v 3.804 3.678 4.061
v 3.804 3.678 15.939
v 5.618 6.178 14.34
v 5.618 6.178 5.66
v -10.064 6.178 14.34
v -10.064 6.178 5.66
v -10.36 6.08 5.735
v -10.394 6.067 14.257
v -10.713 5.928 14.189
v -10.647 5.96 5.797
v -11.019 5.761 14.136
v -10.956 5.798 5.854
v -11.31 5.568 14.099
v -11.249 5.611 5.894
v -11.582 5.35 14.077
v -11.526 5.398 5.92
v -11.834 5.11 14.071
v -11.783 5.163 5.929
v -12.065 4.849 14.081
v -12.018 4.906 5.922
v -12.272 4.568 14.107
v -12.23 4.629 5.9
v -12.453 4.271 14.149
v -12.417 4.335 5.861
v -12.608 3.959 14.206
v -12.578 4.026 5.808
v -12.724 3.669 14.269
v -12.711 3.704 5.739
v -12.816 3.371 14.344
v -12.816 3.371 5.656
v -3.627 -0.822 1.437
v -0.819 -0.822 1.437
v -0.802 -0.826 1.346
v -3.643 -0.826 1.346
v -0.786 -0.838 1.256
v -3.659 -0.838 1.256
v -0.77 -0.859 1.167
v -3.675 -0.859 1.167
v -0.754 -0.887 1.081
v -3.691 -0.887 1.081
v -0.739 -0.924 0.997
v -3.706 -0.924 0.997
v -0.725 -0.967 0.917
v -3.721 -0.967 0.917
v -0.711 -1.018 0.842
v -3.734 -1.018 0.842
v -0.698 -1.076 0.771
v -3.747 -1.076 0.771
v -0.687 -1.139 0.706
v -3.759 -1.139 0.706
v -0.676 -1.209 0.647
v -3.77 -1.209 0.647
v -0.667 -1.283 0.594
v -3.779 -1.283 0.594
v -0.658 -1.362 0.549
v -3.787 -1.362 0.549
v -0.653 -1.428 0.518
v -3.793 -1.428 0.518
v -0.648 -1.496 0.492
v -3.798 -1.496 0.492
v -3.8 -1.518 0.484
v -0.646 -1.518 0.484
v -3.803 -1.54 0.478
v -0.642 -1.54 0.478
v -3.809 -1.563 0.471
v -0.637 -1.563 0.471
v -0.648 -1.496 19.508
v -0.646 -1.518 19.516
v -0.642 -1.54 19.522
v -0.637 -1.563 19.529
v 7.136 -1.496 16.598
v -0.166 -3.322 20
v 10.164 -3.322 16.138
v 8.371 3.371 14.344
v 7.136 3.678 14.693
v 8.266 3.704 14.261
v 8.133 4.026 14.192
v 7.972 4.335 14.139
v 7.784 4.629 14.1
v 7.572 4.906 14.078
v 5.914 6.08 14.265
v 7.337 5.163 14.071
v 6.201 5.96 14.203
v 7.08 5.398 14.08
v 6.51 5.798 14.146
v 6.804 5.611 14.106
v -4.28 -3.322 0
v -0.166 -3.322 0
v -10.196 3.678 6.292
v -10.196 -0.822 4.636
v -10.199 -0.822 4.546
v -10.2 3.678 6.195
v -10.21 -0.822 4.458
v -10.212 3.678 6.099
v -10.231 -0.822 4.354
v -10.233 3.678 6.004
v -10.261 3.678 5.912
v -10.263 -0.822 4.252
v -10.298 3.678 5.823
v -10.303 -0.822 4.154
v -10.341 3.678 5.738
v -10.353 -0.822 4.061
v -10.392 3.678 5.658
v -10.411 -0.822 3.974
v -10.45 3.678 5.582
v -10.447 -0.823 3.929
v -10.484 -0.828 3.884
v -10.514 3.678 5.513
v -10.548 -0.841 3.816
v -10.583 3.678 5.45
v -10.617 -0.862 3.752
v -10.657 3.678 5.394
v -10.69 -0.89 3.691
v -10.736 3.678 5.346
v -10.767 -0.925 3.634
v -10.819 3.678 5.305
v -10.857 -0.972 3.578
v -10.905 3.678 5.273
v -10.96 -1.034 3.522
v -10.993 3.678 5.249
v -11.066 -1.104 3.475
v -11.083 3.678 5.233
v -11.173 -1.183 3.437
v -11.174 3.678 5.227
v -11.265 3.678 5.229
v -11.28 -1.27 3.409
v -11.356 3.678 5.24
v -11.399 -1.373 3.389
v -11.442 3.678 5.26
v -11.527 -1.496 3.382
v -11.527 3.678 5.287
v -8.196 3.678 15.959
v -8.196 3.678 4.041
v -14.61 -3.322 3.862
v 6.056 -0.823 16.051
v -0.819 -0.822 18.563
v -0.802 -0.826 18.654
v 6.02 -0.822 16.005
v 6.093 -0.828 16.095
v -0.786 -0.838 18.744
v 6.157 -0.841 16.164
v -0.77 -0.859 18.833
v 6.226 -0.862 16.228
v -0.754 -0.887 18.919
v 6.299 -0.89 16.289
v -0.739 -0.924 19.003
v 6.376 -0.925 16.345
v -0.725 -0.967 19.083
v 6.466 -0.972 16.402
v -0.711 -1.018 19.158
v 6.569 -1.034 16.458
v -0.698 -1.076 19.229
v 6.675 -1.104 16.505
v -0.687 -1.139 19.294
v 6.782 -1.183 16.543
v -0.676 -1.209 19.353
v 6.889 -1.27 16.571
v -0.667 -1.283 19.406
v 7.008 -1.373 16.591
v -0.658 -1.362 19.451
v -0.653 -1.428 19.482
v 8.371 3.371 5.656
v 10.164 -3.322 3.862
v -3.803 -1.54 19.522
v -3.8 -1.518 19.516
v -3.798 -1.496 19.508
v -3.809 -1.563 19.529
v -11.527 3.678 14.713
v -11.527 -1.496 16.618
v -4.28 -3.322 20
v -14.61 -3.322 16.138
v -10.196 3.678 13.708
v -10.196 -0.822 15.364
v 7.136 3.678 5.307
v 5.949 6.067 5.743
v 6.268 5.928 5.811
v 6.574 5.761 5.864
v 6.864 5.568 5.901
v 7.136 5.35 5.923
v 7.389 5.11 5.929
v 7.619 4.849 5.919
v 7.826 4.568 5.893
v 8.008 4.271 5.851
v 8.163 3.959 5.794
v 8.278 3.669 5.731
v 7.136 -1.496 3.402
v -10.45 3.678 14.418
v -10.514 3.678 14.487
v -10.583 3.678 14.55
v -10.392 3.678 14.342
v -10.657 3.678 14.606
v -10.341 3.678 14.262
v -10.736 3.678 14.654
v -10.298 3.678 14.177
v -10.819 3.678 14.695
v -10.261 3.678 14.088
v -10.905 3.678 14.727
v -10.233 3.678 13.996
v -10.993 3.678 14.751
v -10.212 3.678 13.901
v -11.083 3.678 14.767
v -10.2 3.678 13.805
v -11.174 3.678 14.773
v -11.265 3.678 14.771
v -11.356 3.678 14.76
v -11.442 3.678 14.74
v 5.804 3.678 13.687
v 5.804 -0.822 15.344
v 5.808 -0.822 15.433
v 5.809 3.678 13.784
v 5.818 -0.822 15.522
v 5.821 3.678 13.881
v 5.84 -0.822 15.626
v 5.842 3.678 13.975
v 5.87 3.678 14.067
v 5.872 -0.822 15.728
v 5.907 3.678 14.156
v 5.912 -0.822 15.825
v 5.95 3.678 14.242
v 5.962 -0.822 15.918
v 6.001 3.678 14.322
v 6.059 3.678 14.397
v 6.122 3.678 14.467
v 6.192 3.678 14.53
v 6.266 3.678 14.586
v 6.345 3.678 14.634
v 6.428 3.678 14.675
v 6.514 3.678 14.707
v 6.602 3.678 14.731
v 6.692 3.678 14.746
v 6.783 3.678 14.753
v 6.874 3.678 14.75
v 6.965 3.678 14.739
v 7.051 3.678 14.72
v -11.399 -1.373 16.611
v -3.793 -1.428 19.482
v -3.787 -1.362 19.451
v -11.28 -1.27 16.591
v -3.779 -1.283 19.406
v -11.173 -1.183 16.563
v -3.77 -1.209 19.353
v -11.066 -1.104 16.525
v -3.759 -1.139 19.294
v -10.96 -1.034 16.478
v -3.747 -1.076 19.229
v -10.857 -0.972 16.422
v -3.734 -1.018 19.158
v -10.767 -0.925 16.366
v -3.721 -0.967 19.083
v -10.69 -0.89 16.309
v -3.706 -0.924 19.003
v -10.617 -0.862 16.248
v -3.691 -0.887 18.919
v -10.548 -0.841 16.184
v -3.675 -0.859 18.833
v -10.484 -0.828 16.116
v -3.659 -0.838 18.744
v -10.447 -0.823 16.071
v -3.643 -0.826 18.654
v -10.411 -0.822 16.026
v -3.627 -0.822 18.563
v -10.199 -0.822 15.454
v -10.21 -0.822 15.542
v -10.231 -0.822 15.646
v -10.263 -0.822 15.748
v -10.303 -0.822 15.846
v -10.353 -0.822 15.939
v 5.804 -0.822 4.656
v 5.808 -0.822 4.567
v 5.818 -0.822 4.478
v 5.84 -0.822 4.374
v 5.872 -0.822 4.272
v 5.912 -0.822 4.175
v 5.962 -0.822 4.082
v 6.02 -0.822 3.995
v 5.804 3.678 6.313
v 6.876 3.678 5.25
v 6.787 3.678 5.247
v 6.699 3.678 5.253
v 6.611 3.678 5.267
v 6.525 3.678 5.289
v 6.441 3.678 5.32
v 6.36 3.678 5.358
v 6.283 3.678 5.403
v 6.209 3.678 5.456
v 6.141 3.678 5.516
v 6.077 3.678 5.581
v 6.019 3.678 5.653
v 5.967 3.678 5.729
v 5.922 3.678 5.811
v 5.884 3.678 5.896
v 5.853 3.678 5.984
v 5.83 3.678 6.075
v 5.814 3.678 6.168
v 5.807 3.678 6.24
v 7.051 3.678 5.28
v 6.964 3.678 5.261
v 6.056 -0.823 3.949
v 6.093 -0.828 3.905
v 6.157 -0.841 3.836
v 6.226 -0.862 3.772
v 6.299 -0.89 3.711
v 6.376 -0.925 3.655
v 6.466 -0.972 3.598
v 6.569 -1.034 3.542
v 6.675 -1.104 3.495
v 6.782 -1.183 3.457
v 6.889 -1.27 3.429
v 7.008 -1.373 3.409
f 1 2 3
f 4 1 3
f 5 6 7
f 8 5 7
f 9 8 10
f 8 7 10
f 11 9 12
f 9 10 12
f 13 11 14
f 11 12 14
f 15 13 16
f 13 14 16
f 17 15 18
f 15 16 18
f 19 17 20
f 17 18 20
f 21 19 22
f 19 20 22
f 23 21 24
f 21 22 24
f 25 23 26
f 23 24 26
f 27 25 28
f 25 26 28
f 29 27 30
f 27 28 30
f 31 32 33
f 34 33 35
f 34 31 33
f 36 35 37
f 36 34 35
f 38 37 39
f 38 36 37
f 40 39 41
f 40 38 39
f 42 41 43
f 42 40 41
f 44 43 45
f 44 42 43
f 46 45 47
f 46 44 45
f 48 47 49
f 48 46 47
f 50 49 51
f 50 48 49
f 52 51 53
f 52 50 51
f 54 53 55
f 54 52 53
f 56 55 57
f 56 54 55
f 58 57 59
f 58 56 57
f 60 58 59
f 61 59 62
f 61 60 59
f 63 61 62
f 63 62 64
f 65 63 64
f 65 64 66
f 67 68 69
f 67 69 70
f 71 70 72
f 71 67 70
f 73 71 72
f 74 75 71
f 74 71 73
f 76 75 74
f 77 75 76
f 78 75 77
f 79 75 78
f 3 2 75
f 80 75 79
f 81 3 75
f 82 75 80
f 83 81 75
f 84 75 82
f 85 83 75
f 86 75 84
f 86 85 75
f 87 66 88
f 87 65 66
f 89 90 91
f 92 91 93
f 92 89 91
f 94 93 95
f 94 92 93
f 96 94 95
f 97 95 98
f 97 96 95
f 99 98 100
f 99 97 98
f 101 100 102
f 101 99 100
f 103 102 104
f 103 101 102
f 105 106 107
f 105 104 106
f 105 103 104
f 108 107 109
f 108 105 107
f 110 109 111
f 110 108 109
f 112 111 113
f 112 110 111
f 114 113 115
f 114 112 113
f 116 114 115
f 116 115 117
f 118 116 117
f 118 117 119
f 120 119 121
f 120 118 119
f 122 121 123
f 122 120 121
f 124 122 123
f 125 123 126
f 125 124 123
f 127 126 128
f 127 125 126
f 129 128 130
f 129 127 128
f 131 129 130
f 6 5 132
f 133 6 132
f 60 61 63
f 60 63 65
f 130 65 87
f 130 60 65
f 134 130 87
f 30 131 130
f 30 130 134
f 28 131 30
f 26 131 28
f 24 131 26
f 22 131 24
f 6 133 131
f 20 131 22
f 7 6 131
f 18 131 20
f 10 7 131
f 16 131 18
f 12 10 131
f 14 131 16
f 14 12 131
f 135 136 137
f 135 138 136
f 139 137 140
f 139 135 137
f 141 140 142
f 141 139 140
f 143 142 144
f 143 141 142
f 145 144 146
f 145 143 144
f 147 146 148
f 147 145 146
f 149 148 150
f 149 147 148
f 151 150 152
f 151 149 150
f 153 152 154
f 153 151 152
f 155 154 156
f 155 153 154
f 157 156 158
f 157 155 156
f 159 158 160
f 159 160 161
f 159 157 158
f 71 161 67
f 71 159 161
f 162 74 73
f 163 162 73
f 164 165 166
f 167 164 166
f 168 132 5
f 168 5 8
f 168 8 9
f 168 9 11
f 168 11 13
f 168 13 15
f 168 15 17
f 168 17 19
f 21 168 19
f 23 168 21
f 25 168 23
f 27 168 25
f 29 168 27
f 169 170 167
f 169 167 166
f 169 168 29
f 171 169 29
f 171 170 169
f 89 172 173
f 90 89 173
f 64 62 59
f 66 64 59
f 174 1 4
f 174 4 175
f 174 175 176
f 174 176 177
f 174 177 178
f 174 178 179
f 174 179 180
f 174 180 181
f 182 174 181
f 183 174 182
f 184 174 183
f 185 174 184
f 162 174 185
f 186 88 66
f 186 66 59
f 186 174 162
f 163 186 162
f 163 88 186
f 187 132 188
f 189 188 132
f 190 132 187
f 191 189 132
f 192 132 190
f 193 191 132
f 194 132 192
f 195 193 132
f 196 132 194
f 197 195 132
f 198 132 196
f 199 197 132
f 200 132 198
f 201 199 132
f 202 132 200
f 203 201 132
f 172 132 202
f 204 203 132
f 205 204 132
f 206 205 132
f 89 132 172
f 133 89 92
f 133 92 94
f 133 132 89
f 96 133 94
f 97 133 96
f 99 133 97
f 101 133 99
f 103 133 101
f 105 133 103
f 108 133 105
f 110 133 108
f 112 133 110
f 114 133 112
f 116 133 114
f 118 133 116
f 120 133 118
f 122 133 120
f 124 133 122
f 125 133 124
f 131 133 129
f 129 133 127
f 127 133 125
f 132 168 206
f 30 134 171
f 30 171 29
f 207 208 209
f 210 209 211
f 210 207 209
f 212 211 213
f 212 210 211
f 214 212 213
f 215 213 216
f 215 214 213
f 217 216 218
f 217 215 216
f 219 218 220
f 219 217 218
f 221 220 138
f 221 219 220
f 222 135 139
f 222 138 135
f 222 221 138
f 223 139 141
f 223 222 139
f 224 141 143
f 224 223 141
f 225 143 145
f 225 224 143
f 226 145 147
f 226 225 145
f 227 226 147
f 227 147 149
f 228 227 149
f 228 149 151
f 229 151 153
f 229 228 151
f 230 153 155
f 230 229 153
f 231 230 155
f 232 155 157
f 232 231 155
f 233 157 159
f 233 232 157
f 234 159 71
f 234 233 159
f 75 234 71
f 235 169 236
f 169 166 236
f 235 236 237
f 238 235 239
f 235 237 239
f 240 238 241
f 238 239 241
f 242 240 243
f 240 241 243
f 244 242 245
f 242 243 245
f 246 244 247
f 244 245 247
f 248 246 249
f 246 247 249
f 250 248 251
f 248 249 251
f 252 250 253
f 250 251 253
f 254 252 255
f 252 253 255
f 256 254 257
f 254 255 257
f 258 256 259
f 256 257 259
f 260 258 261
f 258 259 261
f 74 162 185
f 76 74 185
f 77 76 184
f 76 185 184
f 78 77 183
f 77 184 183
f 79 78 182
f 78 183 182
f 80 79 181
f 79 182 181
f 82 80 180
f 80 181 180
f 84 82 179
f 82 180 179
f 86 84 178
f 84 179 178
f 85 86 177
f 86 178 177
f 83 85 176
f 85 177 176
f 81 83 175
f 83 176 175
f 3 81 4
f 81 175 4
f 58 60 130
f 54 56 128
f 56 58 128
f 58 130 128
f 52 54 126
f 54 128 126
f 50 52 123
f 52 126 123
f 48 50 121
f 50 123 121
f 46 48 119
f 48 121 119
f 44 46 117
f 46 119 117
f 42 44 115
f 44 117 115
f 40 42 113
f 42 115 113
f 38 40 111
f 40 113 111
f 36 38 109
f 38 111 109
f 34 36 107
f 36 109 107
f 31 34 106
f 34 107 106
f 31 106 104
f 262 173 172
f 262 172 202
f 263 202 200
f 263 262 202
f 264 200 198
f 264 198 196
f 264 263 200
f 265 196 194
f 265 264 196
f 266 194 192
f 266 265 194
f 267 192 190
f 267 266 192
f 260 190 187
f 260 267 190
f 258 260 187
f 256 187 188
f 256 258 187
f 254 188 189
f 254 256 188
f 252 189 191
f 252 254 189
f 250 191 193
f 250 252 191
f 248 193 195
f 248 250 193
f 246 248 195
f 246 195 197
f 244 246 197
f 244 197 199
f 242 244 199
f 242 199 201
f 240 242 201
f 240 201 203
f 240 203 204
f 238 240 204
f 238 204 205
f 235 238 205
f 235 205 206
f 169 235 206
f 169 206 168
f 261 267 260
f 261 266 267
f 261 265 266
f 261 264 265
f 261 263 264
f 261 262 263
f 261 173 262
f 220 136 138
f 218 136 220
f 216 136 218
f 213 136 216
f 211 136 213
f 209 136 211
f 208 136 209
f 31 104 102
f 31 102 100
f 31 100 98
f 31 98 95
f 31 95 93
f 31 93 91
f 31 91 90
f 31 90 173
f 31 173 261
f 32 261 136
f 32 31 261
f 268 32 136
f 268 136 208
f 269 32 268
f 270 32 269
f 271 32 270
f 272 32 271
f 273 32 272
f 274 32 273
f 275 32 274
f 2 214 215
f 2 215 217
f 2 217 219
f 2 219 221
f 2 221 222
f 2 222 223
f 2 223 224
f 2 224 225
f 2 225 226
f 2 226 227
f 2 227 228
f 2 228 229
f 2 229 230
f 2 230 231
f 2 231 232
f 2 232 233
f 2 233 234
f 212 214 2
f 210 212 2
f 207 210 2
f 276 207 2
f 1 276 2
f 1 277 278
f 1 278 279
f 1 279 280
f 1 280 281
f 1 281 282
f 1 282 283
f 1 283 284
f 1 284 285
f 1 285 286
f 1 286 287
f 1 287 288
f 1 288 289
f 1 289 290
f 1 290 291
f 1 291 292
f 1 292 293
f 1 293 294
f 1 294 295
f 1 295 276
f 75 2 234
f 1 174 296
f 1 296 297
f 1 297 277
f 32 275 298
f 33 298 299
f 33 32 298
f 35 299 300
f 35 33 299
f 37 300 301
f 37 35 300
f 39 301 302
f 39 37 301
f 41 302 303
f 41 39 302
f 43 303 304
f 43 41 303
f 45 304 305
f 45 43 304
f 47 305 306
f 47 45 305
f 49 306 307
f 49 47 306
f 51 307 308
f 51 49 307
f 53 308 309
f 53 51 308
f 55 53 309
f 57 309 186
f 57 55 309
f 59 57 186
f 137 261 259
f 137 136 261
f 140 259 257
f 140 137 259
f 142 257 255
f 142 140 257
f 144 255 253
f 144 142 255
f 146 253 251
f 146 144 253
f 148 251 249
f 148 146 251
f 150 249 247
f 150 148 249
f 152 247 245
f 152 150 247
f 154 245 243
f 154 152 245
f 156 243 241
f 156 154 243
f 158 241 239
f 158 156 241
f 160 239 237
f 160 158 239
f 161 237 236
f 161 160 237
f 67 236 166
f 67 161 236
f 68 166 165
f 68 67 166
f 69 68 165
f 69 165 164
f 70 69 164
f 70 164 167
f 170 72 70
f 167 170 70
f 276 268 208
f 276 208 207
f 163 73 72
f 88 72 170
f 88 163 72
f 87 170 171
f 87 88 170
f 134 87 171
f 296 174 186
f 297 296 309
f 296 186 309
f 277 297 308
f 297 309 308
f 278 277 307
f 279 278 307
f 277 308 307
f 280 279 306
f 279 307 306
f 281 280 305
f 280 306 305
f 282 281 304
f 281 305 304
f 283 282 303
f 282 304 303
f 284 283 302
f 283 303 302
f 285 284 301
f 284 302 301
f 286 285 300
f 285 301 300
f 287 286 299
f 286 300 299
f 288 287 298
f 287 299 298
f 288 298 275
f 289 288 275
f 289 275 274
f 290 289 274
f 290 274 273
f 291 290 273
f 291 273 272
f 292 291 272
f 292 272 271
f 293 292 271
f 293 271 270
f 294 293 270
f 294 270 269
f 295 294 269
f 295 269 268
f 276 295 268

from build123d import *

# Parameters (mm, degrees)
EXTRUDE_1_DEPTH          = 20
CUT_EXTRUDE_1_DEPTH      = 26.52668646
CUT_EXTRUDE_1_DEPTH_BACK = 26.52668646
FILLET_1_R               = 4
CHAMFER_1_SIZE           = 10
CHAMFER_1_SIZE_2         = 3.739269956
FILLET_2_R               = 1


with BuildPart() as part:
    # 草圖2 → 填料-伸長1 (new body)
    with BuildSketch(Plane.XY):
        Polygon((-8.195537152, 3.678491207), (-10.195537152, 3.678491207), (-10.195537152, -0.821508793), (5.804462848, -0.821508793), (5.804462848, 3.678491207), (3.804462848, 3.678491207), (5.618474025, 6.178491207), (7.618474025, 6.178491207), (10.163991353, -3.321508793), (-14.609516351, -3.321508793), (-12.063999023, 6.178491207), (-10.063999023, 6.178491207), align=None)
    extrude(amount=EXTRUDE_1_DEPTH)

    # 草圖3 → 除料-伸長1 (cut, two sides: drawn at the far end of the back side and taken through both)
    with BuildSketch(Plane(origin=(0, 0, 0), x_dir=(0, 0, -1), z_dir=(1, 0, 0)).offset(-CUT_EXTRUDE_1_DEPTH_BACK)):
        Polygon((-20, -3.321508793), (-17.454482672, 6.178491207), (-20, 6.178491207), align=None)
        Polygon((0, 6.178491207), (-2.545517328, 6.178491207), (0, -3.321508793), align=None)
    extrude(amount=CUT_EXTRUDE_1_DEPTH + CUT_EXTRUDE_1_DEPTH_BACK, mode=Mode.SUBTRACT)

    # 圓角1
    # the kernel refuses this fillet: 4 mm, written as the material it takes off along each edge
    with BuildSketch(Plane(origin=(7.618474025, 6.178491207, -4.720017408), x_dir=(-1, 0, 0), z_dir=(0, 0, 1))) as fillet_1_piece_1:
        with BuildLine():
            CenterArc((3.1115198, 3.842463238), FILLET_1_R, 195, 58.866285833)
            Line((-0.752183505, 2.807187057), (-0.829457571, 2.786481534))
            Line((-0.829457571, 2.786481534), (-0.077274066, -0.020705524))
            Line((-0.077274066, -0.020705524), (0, -0.08))
            ThreePointArc((0, -0.08), (1, -0.08), (1.977769604, -0.076849265))
            Line((1.977769604, -0.076849265), (2, 0))
        make_face()
    extrude(amount=29.440034816, mode=Mode.SUBTRACT)
    with BuildSketch(Plane(origin=(-12.063999023, 6.178491207, -4.720017408), x_dir=(1, 0, 0), z_dir=(0, 0, 1))) as fillet_1_piece_2:
        with BuildLine():
            CenterArc((3.1115198, -3.842463238), FILLET_1_R, 106.133714167, 58.866285833)
            Line((-0.752183505, -2.807187057), (-0.829457571, -2.786481534))
            Line((-0.829457571, -2.786481534), (-0.077274066, 0.020705524))
            Line((-0.077274066, 0.020705524), (0, 0.08))
            ThreePointArc((0, 0.08), (1, 0.08), (1.977769604, 0.076849265))
            Line((1.977769604, 0.076849265), (2, 0))
        make_face()
    extrude(amount=29.440034816, mode=Mode.SUBTRACT)

    # 導角1
    # the kernel refuses this chamfer: 10, 3.739269956 mm, written as the material it takes off along each edge
    with BuildSketch(Plane(origin=(16.664078496, -27.580164265, -6.500087143), x_dir=(-0.9680162049238082, -0.23859176587740763, -0.07757961240176374), z_dir=(-0.25056280708573614, 0.9351131265310298, 0.25056280708572526)), Plane(origin=(-6.316095385, 27.629959622, 8.293420966), x_dir=(0.9680162049238085, -0.23859176587740732, -0.0775796124017635), z_dir=(-0.2505628070857358, -0.93511312653103, -0.2505628070857253)), Plane(origin=(-21.109603495, -27.580164265, 26.500087143), x_dir=(0.9680162049238082, -0.23859176587740735, 0.07757961240176349), z_dir=(0.25056280708573586, 0.9351131265310301, -0.2505628070857251)), Plane(origin=(1.870570387, 27.629959622, 11.706579034), x_dir=(-0.9680162049238082, -0.23859176587740777, 0.07757961240176336), z_dir=(0.25056280708573614, -0.93511312653103, 0.25056280708572504))) as chamfer_1_piece_1:
        Polygon((CHAMFER_1_SIZE * 0.999913086528, CHAMFER_1_SIZE * 0.0131840581986), (-CHAMFER_1_SIZE_2 * 0.080135920558, CHAMFER_1_SIZE_2 * 0.996783945724), (0, 0), align=None)
    extrude(amount=59.041117401, mode=Mode.SUBTRACT)

    # 圓角2
    fillet_2_edges = [part.edges().sort_by_distance(p)[0] for p in [
        (5.804462848, 1.428491207, 16.018986119),
        (5.804462848, 1.428491207, 3.981013881),
        (-2.222762499, -0.821508793, 19.330127019),
        (-2.222762499, -0.821508793, 0.669872981),
        (2.484536748, -0.821508793, 18.088717027),
        (-6.902836399, -0.821508793, 18.098897319),
        (-6.902836399, -0.821508793, 1.901102681),
        (2.484536748, -0.821508793, 1.911282973),
        (-10.195537152, 1.428491207, 16.039346704),
        (-10.195537152, 1.428491207, 3.960653296),
    ]]
    fillet(fillet_2_edges, radius=FILLET_2_R)


solid = part.part
